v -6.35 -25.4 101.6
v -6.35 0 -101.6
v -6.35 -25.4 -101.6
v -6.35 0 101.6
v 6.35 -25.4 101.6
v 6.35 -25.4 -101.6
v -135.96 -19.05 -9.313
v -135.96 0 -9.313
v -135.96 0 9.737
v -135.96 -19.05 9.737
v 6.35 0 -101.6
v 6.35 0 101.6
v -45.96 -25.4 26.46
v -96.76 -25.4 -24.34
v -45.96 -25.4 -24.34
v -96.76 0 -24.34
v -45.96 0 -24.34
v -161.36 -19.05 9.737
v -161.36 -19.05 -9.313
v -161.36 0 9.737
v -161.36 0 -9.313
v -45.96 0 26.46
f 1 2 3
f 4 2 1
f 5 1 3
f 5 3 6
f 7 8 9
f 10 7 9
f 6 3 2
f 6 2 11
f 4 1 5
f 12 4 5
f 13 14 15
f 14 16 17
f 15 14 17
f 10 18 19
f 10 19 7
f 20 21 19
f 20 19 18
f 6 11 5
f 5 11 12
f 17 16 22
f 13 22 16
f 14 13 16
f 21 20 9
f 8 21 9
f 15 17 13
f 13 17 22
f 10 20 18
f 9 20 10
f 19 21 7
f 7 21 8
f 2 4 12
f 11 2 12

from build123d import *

# Parameters (mm, degrees)
F0_W     = 12.7
F0_H     = 203.2
F1_DEPTH = 25.4
F3_DEPTH = 25.4
F4_W     = 25.4
F4_H     = 19.05
F5_DEPTH = 19.05


with BuildPart() as f1:
    # F0 (on Front) → F1 (new body)
    with BuildSketch(Plane.XZ):
        Rectangle(F0_W, F0_H)
    extrude(amount=F1_DEPTH)


with BuildPart() as f3:
    # F2 (on Front) → F3 (new body)
    with BuildSketch(Plane.XZ):
        Polygon((-45.960346, 26.460437), (-96.760346, -24.339563), (-45.960346, -24.339563), align=None)
    extrude(amount=F3_DEPTH)


with BuildPart() as f5:
    # F4 (on Front) → F5 (new body)
    with BuildSketch(Plane.XZ):
        with Locations((-148.66014, 0.212088)):
            Rectangle(F4_W, F4_H)
    extrude(amount=F5_DEPTH)


solid = Compound([f1.part, f3.part, f5.part])
